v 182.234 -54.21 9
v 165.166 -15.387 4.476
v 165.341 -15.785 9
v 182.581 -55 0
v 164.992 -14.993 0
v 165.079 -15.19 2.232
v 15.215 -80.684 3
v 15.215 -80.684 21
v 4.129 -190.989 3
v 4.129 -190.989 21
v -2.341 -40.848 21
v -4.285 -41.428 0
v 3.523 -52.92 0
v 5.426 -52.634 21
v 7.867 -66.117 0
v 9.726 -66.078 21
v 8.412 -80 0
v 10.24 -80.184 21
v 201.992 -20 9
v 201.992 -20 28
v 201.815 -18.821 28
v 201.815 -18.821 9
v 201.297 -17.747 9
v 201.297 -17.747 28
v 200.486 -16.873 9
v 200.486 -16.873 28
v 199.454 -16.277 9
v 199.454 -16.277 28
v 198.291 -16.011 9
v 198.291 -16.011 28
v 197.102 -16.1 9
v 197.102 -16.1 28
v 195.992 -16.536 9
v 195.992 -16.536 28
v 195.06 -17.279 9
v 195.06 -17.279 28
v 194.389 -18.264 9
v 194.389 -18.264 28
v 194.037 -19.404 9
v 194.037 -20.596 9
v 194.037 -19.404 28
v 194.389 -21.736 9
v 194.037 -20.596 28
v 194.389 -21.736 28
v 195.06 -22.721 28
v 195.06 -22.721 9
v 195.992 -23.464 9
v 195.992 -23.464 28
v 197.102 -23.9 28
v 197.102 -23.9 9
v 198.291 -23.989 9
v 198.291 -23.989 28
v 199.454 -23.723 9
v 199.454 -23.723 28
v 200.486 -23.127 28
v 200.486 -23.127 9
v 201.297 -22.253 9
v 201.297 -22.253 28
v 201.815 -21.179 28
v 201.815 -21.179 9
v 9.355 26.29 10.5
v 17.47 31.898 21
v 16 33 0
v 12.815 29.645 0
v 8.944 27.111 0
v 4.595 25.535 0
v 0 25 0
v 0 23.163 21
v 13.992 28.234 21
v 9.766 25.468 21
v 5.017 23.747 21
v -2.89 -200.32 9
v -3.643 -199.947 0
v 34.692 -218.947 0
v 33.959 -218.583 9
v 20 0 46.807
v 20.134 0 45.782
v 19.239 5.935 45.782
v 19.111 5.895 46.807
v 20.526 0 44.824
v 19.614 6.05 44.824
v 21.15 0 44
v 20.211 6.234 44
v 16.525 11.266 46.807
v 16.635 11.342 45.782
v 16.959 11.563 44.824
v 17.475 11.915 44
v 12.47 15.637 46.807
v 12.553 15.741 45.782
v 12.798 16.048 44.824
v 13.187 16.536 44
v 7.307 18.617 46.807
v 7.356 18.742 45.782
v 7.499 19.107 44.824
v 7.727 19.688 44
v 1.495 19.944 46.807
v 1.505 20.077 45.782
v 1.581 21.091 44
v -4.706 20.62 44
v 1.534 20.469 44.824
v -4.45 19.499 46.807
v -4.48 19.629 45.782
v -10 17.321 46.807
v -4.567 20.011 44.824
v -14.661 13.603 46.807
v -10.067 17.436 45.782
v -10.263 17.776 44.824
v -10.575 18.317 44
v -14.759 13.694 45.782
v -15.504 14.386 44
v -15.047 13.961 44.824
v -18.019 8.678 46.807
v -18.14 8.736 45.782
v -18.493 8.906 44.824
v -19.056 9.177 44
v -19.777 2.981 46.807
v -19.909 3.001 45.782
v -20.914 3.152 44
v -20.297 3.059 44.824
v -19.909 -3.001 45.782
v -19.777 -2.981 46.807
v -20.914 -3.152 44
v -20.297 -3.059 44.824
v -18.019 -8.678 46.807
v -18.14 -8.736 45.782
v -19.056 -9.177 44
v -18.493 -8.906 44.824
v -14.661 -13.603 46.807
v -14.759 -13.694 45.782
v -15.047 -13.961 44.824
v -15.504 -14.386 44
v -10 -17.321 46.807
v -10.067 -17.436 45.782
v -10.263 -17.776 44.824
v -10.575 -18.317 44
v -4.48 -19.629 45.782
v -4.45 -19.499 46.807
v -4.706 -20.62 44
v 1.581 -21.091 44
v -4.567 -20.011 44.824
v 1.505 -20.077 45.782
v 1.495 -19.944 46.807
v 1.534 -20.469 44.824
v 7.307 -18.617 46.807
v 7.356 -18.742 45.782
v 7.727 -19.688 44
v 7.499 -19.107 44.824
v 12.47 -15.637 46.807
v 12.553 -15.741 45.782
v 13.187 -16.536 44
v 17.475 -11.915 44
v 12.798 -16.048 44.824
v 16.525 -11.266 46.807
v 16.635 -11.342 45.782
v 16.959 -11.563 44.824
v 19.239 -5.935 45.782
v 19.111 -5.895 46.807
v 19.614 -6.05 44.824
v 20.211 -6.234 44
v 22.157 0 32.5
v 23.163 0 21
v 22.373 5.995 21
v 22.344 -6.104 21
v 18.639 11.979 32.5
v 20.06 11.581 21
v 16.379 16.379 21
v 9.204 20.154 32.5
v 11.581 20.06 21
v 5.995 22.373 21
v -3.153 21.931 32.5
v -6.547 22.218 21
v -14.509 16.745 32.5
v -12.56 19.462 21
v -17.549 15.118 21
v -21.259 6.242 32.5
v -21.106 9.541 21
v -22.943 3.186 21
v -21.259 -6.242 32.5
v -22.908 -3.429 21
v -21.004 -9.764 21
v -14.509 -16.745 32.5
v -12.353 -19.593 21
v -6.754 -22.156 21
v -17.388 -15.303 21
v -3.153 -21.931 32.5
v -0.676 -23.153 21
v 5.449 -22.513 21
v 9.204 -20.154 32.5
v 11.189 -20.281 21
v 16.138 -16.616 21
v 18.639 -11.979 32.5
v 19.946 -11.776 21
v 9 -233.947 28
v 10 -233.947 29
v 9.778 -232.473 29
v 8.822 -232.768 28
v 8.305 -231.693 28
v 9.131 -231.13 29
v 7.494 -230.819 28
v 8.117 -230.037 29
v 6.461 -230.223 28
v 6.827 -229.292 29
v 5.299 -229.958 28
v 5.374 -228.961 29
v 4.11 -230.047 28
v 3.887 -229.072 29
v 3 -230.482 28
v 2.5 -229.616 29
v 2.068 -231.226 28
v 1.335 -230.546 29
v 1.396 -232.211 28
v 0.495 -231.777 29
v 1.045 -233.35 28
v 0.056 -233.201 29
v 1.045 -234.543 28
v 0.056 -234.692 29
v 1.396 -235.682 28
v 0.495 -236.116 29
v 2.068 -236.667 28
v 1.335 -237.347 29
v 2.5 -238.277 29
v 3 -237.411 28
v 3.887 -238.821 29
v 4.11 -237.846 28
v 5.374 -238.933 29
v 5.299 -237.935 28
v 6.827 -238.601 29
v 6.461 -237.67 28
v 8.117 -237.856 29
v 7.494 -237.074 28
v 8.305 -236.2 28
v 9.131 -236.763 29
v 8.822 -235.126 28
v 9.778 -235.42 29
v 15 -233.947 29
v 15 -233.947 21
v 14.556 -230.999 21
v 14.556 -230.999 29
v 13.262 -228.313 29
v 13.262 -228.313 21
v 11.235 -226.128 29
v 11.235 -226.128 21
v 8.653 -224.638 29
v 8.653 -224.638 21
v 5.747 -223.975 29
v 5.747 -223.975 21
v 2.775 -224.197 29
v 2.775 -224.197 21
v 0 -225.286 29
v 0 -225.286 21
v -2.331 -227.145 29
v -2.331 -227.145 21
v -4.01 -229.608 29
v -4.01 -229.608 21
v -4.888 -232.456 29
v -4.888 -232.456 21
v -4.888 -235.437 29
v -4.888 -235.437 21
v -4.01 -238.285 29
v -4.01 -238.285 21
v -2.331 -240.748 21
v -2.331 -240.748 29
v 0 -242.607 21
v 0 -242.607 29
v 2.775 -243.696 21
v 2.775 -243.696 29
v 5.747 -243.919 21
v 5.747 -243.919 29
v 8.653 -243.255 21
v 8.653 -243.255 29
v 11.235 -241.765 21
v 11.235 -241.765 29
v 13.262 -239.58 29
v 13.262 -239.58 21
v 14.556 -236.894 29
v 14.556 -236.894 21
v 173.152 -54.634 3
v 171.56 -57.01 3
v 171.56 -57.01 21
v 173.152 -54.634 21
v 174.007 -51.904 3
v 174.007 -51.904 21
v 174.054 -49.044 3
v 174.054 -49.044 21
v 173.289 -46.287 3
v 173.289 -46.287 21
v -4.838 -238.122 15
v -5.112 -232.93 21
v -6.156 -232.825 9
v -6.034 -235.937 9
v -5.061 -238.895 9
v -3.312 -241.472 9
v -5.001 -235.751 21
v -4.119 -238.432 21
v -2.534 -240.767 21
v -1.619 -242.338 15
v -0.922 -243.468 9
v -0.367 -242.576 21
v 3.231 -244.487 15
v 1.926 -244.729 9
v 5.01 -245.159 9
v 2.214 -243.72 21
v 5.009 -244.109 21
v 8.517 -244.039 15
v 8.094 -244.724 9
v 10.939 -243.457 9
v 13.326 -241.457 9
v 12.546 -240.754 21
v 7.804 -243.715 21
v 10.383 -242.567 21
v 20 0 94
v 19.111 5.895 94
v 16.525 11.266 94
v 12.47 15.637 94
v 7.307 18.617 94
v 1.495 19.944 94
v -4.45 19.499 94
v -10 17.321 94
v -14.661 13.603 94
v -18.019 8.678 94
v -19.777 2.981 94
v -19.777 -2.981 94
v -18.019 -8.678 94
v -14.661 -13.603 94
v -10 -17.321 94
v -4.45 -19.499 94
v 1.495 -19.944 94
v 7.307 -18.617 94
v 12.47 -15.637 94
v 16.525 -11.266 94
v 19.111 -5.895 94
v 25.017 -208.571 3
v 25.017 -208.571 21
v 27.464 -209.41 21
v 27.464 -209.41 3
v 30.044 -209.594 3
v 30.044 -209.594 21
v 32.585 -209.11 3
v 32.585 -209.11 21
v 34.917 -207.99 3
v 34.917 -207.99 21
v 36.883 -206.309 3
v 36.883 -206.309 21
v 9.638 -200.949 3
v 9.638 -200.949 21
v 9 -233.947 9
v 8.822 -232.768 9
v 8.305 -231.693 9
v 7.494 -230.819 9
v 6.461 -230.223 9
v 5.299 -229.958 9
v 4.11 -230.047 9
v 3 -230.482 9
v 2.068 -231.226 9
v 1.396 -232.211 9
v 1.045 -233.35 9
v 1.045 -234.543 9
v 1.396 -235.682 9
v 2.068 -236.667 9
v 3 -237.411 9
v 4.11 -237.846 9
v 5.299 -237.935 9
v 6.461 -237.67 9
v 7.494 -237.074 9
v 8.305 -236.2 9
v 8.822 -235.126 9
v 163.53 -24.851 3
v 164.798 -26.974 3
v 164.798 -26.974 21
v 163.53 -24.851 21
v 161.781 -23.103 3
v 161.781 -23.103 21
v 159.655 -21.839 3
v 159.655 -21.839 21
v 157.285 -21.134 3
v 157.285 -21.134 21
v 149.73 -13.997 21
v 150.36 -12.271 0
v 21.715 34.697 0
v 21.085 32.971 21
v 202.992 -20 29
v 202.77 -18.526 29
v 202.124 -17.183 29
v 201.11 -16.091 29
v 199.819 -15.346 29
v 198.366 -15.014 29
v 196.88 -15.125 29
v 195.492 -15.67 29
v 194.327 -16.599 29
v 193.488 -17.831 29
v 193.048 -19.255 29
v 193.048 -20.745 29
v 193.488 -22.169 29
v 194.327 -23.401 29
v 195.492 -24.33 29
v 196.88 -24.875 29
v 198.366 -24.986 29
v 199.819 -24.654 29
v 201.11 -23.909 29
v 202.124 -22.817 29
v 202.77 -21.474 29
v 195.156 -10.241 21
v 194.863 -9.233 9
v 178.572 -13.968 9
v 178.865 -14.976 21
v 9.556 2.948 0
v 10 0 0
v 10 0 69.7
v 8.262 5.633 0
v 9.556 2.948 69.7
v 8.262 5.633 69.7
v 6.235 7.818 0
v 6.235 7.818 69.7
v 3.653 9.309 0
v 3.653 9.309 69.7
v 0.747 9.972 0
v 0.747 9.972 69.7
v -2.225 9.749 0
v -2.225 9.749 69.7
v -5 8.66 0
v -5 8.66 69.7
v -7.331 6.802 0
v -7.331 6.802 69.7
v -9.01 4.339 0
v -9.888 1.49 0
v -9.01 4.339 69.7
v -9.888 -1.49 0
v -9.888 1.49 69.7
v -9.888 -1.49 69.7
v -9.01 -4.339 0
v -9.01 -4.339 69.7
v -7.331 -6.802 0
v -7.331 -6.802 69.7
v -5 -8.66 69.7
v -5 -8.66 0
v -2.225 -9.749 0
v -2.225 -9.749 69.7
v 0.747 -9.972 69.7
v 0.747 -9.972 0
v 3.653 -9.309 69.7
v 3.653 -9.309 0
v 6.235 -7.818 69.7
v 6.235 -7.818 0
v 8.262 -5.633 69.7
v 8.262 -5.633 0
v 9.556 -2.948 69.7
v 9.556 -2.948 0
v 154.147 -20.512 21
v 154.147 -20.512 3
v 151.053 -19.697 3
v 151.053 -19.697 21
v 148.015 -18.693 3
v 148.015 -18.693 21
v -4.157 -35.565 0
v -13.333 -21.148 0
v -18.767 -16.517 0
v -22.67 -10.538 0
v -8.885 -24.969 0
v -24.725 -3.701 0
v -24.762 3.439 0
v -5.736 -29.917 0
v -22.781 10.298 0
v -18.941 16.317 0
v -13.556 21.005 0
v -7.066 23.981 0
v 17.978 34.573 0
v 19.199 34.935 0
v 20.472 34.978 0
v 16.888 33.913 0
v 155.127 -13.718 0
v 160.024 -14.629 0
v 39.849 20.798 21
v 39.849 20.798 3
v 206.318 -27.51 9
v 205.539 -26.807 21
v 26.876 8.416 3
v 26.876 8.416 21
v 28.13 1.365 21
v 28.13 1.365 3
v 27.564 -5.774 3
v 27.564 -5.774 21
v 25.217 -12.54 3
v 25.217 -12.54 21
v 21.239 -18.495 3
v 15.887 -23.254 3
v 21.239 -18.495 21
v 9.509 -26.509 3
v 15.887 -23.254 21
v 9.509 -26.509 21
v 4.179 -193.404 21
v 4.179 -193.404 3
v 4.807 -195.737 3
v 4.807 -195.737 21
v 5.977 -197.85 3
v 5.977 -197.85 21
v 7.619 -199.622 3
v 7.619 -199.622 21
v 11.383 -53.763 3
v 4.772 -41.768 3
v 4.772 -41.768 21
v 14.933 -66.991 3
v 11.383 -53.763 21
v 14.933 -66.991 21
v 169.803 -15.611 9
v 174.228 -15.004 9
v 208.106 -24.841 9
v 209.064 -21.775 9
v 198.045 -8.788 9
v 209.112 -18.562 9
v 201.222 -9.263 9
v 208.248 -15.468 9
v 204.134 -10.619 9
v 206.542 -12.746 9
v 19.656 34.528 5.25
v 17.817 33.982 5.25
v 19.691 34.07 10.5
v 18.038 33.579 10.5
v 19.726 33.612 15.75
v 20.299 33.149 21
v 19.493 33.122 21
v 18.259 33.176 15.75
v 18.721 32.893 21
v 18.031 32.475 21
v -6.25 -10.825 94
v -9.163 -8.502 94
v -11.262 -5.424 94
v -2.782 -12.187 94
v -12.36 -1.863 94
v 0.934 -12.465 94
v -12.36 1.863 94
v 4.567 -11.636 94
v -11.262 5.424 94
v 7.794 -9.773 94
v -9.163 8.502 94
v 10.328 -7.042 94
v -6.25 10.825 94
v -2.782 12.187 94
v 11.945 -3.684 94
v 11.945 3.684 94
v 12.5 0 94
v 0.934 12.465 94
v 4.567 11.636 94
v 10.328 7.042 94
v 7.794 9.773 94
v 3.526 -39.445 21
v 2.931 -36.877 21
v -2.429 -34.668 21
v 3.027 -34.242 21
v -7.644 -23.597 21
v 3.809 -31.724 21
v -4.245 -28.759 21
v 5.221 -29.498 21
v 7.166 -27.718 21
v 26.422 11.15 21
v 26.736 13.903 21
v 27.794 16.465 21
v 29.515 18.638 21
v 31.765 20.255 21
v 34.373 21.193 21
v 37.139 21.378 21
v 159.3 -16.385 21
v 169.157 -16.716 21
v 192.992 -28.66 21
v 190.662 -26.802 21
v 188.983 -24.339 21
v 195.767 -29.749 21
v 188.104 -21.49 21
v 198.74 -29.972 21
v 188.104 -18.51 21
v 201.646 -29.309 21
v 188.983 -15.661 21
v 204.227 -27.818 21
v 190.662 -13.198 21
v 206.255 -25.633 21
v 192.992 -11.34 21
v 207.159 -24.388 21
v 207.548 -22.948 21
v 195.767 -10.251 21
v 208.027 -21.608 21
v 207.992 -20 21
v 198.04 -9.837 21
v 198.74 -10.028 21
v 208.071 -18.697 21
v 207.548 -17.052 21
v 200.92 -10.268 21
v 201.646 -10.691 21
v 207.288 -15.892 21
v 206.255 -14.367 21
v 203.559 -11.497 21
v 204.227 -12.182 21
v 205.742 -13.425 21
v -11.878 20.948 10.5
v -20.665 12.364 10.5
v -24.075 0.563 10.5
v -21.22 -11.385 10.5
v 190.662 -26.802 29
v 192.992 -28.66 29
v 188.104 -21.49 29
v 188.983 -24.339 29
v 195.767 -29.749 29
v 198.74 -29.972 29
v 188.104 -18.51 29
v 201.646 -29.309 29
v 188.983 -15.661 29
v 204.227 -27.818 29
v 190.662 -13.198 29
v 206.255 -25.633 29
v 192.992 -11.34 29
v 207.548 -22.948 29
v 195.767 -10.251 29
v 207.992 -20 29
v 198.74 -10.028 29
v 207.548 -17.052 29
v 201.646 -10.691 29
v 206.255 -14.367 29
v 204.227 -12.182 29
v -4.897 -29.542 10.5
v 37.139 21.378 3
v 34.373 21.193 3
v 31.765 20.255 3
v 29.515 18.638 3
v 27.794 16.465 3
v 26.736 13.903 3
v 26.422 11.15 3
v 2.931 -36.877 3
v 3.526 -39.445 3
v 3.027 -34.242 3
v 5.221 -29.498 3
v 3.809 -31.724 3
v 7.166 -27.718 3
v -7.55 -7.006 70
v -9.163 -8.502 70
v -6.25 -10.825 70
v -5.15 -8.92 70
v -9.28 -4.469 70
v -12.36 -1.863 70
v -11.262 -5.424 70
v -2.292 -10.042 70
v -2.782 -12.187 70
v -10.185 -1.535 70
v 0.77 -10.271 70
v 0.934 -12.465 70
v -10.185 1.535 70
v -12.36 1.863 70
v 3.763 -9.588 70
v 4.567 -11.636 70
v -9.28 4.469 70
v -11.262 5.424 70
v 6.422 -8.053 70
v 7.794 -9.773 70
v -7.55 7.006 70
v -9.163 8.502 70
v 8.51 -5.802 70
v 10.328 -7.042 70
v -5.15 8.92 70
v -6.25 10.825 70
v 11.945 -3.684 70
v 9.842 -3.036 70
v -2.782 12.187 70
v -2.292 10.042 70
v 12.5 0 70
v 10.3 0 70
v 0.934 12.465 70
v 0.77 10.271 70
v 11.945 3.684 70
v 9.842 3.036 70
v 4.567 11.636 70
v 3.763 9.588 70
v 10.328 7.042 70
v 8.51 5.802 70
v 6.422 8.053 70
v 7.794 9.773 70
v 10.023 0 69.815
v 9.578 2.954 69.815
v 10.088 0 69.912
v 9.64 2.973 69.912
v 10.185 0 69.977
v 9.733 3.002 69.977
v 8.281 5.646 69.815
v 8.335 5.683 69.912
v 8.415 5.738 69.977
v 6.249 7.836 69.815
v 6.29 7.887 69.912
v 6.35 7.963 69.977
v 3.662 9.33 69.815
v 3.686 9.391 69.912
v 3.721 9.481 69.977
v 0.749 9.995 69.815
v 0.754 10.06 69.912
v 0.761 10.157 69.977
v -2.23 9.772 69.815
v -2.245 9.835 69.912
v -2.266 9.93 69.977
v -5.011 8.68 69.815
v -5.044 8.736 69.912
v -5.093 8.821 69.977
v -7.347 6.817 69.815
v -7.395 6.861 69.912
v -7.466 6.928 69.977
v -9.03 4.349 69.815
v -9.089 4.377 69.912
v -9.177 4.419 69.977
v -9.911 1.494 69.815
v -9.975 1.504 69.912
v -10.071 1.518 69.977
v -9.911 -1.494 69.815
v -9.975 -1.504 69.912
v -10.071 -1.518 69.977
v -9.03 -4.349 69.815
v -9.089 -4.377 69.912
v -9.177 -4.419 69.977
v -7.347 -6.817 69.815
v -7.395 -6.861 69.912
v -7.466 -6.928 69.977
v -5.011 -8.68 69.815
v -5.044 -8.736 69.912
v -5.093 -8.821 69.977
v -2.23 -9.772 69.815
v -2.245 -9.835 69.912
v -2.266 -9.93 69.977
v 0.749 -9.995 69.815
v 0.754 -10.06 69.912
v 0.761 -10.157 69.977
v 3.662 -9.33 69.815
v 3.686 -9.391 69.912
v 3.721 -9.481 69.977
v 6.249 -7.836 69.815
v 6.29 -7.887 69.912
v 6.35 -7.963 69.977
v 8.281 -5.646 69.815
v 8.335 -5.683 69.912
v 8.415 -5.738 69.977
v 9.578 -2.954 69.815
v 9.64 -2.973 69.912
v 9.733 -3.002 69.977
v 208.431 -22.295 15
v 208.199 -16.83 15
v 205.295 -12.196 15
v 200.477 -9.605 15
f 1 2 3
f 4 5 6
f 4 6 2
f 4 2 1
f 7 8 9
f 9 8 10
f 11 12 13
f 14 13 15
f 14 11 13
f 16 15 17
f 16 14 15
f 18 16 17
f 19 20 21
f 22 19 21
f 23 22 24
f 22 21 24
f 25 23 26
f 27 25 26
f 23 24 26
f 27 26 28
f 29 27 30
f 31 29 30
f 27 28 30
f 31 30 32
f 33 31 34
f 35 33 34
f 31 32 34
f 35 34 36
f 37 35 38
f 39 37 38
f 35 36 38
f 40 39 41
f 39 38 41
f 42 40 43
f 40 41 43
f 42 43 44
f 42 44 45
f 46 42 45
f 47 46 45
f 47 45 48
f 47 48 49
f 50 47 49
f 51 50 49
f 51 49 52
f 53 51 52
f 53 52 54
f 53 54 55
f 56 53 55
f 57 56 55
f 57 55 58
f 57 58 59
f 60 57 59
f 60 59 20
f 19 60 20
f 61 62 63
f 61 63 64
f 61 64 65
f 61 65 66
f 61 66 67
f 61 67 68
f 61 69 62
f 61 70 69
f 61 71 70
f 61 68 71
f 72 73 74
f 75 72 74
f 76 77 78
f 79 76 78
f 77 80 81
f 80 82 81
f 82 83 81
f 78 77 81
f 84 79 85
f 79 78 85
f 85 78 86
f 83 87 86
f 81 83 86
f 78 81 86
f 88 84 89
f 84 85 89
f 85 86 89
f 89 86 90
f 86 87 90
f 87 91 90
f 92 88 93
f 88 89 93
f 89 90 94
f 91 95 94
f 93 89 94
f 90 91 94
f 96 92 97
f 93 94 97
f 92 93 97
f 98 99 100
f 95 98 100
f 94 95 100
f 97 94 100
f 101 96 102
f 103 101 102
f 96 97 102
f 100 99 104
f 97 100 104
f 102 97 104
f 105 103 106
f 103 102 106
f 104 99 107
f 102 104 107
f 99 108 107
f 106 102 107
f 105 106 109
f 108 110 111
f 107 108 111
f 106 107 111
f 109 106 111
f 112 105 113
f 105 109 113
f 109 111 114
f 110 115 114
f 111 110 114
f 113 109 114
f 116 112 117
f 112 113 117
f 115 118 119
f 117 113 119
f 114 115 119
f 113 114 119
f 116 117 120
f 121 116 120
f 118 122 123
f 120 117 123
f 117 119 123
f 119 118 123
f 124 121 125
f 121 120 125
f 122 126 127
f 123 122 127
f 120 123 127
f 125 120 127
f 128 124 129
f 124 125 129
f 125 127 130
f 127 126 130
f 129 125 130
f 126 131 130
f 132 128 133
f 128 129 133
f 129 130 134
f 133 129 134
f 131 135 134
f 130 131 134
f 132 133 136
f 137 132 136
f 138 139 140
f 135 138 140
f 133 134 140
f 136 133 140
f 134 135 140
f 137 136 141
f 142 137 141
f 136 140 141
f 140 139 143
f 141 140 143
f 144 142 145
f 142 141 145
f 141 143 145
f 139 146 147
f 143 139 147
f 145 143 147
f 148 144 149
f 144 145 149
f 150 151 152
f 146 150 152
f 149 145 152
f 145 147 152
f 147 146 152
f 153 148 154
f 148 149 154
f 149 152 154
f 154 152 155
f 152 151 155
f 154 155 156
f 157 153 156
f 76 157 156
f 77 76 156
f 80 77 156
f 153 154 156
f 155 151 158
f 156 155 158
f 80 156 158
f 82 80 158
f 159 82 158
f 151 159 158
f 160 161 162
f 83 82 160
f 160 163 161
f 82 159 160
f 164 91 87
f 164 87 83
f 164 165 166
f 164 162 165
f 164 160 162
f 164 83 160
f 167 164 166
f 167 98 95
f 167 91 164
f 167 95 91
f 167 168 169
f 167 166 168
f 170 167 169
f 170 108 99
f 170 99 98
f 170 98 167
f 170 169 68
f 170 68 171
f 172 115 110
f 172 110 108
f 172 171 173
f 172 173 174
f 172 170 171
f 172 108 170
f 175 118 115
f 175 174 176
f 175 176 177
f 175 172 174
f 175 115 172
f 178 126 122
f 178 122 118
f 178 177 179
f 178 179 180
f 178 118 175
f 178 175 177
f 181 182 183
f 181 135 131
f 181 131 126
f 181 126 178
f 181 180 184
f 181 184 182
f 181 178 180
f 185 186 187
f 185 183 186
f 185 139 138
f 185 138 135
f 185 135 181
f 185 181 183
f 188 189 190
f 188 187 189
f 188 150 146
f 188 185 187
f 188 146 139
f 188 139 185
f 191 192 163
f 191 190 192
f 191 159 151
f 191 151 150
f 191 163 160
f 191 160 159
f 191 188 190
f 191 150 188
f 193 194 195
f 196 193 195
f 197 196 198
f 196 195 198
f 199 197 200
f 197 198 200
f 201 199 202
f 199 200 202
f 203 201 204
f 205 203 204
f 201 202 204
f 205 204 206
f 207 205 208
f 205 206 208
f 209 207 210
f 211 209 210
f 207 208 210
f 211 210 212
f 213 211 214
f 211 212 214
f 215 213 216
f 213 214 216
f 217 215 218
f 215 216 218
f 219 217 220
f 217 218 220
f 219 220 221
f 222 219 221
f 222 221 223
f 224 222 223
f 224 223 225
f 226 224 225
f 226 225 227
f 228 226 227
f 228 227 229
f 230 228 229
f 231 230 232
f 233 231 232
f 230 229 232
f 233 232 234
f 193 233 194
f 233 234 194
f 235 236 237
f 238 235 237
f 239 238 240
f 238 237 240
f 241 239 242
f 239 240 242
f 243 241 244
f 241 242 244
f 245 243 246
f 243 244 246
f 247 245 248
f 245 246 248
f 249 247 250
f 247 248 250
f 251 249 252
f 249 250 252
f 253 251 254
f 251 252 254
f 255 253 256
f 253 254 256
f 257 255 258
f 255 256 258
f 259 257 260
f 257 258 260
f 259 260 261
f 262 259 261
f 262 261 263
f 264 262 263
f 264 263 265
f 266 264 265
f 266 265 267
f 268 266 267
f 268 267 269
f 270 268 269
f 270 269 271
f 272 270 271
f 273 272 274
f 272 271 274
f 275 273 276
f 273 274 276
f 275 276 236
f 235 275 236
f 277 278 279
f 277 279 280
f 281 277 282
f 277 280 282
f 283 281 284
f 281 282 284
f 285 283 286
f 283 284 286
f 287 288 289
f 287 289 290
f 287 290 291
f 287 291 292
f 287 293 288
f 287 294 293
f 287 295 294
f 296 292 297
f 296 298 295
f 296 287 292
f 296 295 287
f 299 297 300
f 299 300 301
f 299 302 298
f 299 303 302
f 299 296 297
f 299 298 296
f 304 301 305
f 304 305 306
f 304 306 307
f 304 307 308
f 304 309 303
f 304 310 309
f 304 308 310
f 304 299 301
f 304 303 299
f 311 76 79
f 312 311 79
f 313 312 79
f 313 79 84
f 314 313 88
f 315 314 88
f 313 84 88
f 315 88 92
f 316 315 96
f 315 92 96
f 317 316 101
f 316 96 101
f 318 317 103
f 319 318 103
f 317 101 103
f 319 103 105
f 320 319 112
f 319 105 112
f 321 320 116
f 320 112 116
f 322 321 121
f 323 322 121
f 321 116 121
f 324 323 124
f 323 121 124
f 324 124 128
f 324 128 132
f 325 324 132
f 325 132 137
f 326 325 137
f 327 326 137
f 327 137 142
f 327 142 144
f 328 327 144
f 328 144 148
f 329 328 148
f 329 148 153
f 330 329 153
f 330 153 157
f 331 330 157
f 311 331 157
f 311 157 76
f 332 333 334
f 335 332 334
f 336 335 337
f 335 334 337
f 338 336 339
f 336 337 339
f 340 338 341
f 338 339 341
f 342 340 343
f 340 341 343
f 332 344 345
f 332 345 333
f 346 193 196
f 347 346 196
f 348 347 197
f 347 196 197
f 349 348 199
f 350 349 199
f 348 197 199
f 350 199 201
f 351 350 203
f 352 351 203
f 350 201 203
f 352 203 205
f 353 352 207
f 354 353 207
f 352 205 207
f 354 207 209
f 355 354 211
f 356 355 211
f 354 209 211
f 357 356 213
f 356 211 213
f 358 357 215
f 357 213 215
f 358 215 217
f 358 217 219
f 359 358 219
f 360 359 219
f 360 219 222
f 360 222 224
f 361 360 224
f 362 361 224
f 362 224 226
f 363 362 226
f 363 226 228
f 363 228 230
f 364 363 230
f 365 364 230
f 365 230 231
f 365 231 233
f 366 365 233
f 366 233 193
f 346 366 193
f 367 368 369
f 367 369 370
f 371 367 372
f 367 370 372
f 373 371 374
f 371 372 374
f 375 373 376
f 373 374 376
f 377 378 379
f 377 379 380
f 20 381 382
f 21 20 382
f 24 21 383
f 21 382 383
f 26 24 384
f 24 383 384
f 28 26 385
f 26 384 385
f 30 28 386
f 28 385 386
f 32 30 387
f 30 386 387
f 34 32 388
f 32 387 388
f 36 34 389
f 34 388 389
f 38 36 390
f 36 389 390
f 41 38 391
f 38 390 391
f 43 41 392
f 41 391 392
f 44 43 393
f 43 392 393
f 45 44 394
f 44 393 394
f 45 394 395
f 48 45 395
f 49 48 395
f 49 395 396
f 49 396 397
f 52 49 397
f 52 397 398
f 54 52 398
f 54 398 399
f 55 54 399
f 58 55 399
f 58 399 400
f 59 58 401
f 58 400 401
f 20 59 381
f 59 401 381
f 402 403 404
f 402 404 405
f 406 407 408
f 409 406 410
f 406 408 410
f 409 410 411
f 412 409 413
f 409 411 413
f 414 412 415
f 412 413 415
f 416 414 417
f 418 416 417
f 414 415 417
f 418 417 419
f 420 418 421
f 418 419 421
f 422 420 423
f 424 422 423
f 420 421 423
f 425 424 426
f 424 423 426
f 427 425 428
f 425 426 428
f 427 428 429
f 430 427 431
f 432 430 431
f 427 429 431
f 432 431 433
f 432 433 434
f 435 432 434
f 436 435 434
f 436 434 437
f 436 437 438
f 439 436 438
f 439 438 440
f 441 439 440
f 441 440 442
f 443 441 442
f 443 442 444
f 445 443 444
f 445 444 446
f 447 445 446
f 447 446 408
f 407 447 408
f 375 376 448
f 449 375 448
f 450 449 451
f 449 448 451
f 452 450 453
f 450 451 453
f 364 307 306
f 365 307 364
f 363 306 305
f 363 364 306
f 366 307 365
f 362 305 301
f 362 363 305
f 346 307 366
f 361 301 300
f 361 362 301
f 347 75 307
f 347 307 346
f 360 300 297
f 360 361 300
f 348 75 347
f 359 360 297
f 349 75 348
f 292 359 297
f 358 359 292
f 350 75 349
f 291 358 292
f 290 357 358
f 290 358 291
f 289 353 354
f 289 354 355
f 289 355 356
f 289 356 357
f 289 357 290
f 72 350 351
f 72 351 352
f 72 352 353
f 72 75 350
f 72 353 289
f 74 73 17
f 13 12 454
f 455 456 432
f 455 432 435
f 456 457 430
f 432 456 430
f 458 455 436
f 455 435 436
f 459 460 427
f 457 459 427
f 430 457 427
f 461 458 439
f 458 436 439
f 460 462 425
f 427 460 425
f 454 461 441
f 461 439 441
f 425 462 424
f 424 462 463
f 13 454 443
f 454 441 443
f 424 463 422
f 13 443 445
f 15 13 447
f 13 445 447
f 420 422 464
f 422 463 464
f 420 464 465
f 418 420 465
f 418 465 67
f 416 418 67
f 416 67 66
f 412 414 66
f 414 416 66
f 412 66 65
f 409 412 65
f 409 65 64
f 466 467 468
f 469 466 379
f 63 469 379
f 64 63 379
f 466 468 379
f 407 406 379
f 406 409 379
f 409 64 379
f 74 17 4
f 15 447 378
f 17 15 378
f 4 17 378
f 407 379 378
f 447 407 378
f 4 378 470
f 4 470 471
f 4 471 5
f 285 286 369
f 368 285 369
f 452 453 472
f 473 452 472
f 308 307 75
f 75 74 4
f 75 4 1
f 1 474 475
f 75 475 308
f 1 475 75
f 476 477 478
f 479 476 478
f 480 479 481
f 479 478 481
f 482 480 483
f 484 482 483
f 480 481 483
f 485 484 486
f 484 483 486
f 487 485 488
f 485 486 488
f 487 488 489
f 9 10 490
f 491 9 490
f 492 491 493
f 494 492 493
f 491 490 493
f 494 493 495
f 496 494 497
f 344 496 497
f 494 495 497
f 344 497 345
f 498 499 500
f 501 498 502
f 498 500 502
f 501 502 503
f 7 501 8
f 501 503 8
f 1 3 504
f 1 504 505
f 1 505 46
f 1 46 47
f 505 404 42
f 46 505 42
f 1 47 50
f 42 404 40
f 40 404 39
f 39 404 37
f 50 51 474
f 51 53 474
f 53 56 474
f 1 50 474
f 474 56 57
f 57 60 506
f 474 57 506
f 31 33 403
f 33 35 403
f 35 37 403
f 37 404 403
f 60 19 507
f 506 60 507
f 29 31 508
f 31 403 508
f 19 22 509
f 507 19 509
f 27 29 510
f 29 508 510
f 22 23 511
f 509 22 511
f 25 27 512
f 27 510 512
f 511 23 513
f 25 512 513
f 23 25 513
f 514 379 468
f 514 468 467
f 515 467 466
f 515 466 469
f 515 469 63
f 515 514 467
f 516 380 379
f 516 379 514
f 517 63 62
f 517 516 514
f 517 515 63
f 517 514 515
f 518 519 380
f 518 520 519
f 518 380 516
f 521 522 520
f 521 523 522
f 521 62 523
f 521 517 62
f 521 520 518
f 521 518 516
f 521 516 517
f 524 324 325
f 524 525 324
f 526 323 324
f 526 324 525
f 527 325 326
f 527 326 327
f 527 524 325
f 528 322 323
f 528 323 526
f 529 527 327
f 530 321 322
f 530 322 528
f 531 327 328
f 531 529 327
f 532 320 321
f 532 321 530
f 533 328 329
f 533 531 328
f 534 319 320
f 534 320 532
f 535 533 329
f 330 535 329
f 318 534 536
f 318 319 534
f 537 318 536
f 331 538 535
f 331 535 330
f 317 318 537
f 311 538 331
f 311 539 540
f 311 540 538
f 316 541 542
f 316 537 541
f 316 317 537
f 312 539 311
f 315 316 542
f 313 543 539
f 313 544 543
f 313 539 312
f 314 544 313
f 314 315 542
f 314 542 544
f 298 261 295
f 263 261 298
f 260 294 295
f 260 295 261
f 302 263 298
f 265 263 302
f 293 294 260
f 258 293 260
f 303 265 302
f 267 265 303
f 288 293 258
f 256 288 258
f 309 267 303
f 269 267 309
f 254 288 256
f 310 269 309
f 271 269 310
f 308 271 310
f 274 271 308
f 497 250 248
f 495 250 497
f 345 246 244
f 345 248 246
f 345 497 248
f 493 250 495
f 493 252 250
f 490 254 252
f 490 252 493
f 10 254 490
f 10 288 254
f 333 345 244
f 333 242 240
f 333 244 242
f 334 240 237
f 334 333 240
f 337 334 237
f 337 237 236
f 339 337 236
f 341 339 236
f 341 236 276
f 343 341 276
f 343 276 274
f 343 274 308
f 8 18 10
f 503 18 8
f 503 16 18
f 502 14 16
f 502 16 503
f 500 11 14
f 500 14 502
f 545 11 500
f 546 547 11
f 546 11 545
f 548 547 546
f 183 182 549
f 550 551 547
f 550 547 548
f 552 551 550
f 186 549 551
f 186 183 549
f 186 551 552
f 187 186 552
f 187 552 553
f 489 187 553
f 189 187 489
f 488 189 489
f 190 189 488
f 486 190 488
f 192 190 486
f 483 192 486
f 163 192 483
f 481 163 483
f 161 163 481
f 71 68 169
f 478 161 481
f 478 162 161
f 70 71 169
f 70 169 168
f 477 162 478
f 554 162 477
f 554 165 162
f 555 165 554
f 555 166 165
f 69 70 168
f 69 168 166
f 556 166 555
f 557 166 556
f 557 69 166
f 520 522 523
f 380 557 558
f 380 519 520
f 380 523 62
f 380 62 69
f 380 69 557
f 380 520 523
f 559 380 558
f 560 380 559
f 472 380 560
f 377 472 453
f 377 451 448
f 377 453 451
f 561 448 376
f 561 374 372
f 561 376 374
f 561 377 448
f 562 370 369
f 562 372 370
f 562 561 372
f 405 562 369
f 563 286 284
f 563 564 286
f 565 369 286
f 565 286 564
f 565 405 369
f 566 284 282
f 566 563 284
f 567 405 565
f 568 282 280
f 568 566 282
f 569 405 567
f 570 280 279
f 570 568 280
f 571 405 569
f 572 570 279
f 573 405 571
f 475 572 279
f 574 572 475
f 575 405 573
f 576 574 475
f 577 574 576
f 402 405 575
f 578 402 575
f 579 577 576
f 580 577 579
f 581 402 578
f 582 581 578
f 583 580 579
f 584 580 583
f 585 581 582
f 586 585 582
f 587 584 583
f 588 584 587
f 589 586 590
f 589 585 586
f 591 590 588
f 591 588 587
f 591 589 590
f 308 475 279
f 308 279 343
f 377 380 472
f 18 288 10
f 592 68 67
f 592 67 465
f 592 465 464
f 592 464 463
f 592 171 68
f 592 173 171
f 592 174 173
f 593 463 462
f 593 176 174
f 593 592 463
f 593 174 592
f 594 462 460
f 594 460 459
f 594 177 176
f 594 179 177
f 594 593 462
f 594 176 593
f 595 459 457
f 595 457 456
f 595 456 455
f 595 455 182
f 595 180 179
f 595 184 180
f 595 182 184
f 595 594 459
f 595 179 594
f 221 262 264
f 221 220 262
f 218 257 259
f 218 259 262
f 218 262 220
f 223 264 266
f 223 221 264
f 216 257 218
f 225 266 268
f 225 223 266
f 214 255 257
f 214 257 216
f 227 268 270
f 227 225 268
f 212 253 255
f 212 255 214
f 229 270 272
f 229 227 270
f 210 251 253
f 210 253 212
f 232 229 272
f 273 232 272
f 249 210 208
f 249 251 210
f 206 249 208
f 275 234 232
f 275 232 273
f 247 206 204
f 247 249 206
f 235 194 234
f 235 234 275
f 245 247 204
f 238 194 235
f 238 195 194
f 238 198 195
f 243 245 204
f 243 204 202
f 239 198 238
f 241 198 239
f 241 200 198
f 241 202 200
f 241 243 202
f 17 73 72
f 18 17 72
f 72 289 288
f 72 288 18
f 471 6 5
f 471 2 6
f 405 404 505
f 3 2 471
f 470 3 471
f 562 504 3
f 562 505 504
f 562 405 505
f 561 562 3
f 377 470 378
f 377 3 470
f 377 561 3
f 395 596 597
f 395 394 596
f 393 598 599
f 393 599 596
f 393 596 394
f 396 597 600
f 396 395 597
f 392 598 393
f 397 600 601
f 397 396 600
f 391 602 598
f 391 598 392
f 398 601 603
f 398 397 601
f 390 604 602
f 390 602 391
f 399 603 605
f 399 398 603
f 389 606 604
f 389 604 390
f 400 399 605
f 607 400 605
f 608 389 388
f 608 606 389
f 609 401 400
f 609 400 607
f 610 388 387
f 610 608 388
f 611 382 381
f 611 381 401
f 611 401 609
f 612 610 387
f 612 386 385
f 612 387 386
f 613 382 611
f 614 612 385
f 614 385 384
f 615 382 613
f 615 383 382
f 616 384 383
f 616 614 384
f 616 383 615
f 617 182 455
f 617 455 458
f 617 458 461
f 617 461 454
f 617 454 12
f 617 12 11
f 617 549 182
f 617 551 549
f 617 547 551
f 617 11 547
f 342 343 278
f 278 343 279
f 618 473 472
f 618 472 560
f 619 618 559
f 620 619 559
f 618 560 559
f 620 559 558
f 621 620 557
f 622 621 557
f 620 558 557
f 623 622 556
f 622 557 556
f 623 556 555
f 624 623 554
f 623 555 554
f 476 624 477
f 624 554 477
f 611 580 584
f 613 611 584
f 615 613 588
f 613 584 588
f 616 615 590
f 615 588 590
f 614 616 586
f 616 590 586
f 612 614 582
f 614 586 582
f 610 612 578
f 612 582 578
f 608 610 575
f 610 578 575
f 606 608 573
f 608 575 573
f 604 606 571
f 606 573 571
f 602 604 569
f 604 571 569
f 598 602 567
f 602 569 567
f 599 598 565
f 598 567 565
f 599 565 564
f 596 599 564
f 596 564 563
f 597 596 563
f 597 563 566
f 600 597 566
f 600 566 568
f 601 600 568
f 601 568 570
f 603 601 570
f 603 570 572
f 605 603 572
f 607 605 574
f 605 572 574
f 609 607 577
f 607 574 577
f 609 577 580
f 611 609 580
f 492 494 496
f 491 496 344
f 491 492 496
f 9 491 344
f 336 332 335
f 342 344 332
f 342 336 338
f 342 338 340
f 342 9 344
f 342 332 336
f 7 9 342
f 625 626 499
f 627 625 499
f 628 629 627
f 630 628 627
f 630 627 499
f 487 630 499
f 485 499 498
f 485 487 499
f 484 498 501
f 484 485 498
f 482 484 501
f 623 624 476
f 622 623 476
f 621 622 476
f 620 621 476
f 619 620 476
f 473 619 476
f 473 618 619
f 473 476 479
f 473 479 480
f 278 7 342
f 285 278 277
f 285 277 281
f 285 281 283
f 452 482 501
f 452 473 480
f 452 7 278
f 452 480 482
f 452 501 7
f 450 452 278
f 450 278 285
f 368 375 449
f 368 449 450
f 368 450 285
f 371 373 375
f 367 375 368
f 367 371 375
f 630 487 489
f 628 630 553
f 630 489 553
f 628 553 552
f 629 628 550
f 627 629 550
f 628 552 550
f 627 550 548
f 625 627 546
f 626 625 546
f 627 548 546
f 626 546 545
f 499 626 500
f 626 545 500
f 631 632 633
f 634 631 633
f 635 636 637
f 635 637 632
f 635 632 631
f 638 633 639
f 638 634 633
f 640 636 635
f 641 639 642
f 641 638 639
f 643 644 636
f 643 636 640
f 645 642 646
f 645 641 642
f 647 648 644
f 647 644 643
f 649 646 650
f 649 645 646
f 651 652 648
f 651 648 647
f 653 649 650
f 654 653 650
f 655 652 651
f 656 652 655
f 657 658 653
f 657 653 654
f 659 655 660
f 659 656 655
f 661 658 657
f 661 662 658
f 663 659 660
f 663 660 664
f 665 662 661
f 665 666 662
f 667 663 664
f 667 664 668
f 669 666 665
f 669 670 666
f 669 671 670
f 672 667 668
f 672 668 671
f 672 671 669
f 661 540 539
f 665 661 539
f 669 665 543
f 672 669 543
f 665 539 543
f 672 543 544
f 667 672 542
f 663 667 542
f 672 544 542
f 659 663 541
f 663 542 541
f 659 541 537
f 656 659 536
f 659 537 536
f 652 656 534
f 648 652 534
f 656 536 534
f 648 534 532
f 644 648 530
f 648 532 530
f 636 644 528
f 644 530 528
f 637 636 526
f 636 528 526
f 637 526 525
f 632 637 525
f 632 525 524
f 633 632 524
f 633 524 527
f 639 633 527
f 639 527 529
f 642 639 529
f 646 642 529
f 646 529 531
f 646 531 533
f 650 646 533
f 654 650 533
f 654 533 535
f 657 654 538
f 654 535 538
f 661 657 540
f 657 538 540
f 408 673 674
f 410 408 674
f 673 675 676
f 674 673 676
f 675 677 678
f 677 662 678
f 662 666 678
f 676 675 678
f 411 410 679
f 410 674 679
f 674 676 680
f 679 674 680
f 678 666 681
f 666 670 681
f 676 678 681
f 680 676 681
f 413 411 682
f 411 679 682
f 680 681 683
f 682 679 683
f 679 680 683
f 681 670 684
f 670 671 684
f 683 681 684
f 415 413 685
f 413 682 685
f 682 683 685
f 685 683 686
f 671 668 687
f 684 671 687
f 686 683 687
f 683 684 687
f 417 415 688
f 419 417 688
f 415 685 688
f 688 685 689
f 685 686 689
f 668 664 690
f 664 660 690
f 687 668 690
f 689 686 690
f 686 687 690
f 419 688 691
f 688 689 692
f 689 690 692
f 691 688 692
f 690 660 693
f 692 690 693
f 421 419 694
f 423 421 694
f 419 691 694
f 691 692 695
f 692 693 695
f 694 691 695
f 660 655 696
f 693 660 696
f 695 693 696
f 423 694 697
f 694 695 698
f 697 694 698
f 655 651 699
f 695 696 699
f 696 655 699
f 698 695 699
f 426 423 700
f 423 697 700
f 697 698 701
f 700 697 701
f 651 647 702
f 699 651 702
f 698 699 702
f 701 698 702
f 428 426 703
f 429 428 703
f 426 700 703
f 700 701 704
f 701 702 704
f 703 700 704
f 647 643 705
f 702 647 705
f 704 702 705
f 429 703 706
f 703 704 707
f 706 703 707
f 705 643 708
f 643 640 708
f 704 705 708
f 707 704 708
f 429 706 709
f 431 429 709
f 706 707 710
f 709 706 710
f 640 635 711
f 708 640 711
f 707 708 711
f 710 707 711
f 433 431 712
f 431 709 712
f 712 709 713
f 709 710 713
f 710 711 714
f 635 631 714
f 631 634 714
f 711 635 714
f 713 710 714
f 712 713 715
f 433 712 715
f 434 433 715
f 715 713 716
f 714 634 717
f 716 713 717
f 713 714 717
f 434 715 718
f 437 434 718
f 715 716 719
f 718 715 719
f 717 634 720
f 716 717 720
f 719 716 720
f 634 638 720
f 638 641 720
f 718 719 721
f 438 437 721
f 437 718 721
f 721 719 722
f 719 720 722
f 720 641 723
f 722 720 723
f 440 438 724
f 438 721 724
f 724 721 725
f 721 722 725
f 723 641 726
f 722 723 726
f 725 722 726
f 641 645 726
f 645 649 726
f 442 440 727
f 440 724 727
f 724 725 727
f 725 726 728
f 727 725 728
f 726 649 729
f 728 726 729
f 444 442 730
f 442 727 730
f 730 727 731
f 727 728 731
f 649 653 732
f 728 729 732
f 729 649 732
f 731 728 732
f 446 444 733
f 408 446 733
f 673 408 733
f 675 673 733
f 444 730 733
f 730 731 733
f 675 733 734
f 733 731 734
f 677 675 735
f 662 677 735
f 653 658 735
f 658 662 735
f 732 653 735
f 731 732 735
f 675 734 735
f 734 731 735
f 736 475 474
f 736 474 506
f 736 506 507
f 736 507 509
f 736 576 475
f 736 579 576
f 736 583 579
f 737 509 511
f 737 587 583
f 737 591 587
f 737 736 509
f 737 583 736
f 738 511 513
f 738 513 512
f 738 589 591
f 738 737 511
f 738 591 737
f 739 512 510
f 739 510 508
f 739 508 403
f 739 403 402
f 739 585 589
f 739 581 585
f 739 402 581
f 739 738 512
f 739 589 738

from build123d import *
from build123d.topology import SkipClean

# Parameters (mm, degrees)
EXTRUDE_741_DEPTH      = 21
EXTRUDE_741_TAPER      = 5
SKETCH_2_R             = 10
EXTRUDE_1024_DEPTH     = 8
CUT_EXTRUDE_1617_DEPTH = 9
SKETCH_4_R             = 23.162738066
EXTRUDE_1852_DEPTH     = 23
EXTRUDE_1852_TAPER     = 5
SKETCH_5_R             = 20
EXTRUDE_1938_DEPTH     = 50
FILLET_1977_R          = 4
SKETCH_6_R             = 12.5
CUT_EXTRUDE_2083_DEPTH = 24
SKETCH_7_R             = 10
CUT_EXTRUDE_2165_DEPTH = 330.802615362
FILLET_2203_R          = 0.3
SKETCH_8_R             = 4
CUT_EXTRUDE_2369_DEPTH = 329.777683375
CHAMFER_2404_SIZE      = 1
CUT_EXTRUDE_3109_DEPTH = 18


with BuildPart() as part:
    # Эскиз1 → Extrude 741 (new body)
    with BuildSketch(Plane.XY):
        with BuildLine():
            ThreePointArc((206.902825712, -28.037707575), (208.16042902, -13.627270923), (194.643197369, -8.47686326))
            Line((194.643197369, -8.47686326), (178.352602864, -13.211762774))
            ThreePointArc((178.352602864, -13.211762774), (164.281318134, -14.974601832), (150.3601632, -12.270882024))
            Line((150.3601632, -12.270882024), (21.714759937, 34.696764669))
            ThreePointArc((21.714759937, 34.696764669), (18.576858011, 34.793189635), (16, 33))
            ThreePointArc((16, 33), (8.94427191, 27.11145618), (0, 25))
            ThreePointArc((0, 25), (-24.017605322, 6.939354046), (-13.333333333, -21.147629234))
            ThreePointArc((-13.333333333, -21.147629234), (-5.735545873, -29.916516988), (-4.284649798, -41.428018512))
            ThreePointArc((-4.284649798, -41.428018512), (6.155658081, -59.36704661), (8.411759167, -80))
            Line((8.411759167, -80), (-6.939849245, -232.746575098))
            ThreePointArc((-6.939849245, -232.746575098), (0.139115456, -244.91798346), (13.910401615, -241.984282673))
            Line((13.910401615, -241.984282673), (206.902825712, -28.037707575))
        make_face()
    extrude(amount=EXTRUDE_741_DEPTH, taper=EXTRUDE_741_TAPER)

    # Эскиз2 → Extrude 1024 (add)
    with BuildSketch(Plane.XY.offset(21)):
        with Locations((5, -233.946575098)):
            Circle(SKETCH_2_R)
        with Locations((197.992424097, -20)):
            Circle(SKETCH_2_R)
    extrude(amount=EXTRUDE_1024_DEPTH)

    # Эскиз3 → Cut-Extrude 1617 (cut)
    with BuildSketch(Plane(origin=(0, 0, 0), x_dir=(-1, 0, 0), z_dir=(0, 0, -1))):
        with BuildLine():
            Line((-164.992424097, -14.992878037), (-182.581248366, -55))
            Line((-182.581248366, -55), (-206.902825712, -28.037707575))
            ThreePointArc((-206.902825712, -28.037707575), (-208.364208989, -13.964597929), (-195.406790483, -8.281873067))
            Line((-195.406790483, -8.281873067), (-164.992424097, -14.992878037))
        make_face()
        with BuildLine():
            Line((3.643325211, -199.946575098), (-34.691772051, -218.946575098))
            Line((-34.691772051, -218.946575098), (-13.910401615, -241.984282673))
            ThreePointArc((-13.910401615, -241.984282673), (-0.139115456, -244.91798346), (6.939849245, -232.746575098))
            Line((6.939849245, -232.746575098), (3.643325211, -199.946575098))
        make_face()
    extrude(amount=-CUT_EXTRUDE_1617_DEPTH, mode=Mode.SUBTRACT)

    # Эскиз4 → Extrude 1852 (add)
    with SkipClean():  # the faces are left unmerged after this step: merging them gives an invalid solid
        with BuildSketch(Plane.XY.offset(21)):
            Circle(SKETCH_4_R)
        extrude(amount=EXTRUDE_1852_DEPTH, taper=EXTRUDE_1852_TAPER)

    # Эскиз5 → Extrude 1938 (add)
    with SkipClean():  # the faces are left unmerged after this step: merging them gives an invalid solid
        with BuildSketch(Plane.XY.offset(44)):
            Circle(SKETCH_5_R)
        extrude(amount=EXTRUDE_1938_DEPTH)

    # Fillet 1977
    # the kernel refuses this fillet: 4 mm, written as the material it adds along each edge
    with BuildSketch(Plane(origin=(0, 0, 44), x_dir=(1, 0, 0), z_dir=(0, -1, 0))) as fillet_1977_piece_1:
        with BuildLine():
            CenterArc((24, 2.807194852), FILLET_1977_R, 180, 44.571493735)
            Line((20, 2.807194852), (19.92, 2.807194852))
            Line((19.92, 2.807194852), (19.92, 0))
            Line((19.92, 0), (20, -0.08))
            ThreePointArc((20, -0.08), (20.575249402, -0.08), (21.093508781, -0.056143897))
            Line((21.093508781, -0.056143897), (21.150498805, 0))
        make_face()
    revolve(axis=Axis((0, 0, 44), (0, 0, 1)))

    # Эскиз6 → Cut-Extrude 2083 (cut)
    with SkipClean():  # the faces are left unmerged after this step: merging them gives an invalid solid
        with BuildSketch(Plane.XY.offset(94)):
            Circle(SKETCH_6_R)
        extrude(amount=-CUT_EXTRUDE_2083_DEPTH, mode=Mode.SUBTRACT)

    # Эскиз7 → Cut-Extrude 2165 (cut, through all)
    with SkipClean():  # the faces are left unmerged after this step: merging them gives an invalid solid
        with BuildSketch(Plane.XY.offset(70)):
            Circle(SKETCH_7_R)
        extrude(amount=-CUT_EXTRUDE_2165_DEPTH, mode=Mode.SUBTRACT)

    # Fillet 2203
    fillet_2203_edges = [part.edges().sort_by_distance(p)[0] for p in [
        (-10, 0, 70),
    ]]
    fillet(fillet_2203_edges, radius=FILLET_2203_R)

    # Эскиз8 → Cut-Extrude 2369 (cut, through all)
    with SkipClean():  # the faces are left unmerged after this step: merging them gives an invalid solid
        with BuildSketch(Plane.XY.offset(29)):
            with Locations((197.992424097, -20)):
                Circle(SKETCH_8_R)
            with Locations((5, -233.946575098)):
                Circle(SKETCH_8_R)
        extrude(amount=-CUT_EXTRUDE_2369_DEPTH, mode=Mode.SUBTRACT)

    # Chamfer 2404
    chamfer_2404_edges = [part.edges().sort_by_distance(p)[0] for p in [
        (193.992424097, -20, 29),
        (1, -233.946575098, 29),
    ]]
    chamfer(chamfer_2404_edges, length=CHAMFER_2404_SIZE)

    # Эскиз11 → Cut-Extrude 3109 (cut)
    with SkipClean():  # the faces are left unmerged after this step: merging them gives an invalid solid
        with BuildSketch(Plane.XY.offset(21)):
            with BuildLine():
                Line((9.637769662, -200.948644603), (25.017172577, -208.571128339))
                ThreePointArc((25.017172577, -208.571128339), (31.330335402, -209.434392448), (36.883287498, -206.3093368))
                Line((36.883287498, -206.3093368), (171.559935828, -57.010172388))
                ThreePointArc((171.559935828, -57.010172388), (174.007077586, -51.904002649), (173.288958057, -46.287439952))
                Line((173.288958057, -46.287439952), (164.797960407, -26.974018349))
                ThreePointArc((164.797960407, -26.974018349), (161.780560792, -23.10323492), (157.284911476, -21.134275293))
                ThreePointArc((157.284911476, -21.134275293), (152.593572172, -20.128602218), (148.015310631, -18.693484081))
                Line((148.015310631, -18.693484081), (39.848510542, 20.797550357))
                ThreePointArc((39.848510542, 20.797550357), (29.514566508, 18.6378946), (26.875914748, 8.415760323))
                ThreePointArc((26.875914748, 8.415760323), (25.216951873, -12.539742964), (9.508763983, -26.50892723))
                ThreePointArc((9.508763983, -26.50892723), (3.334586222, -32.957378734), (4.772476125, -41.76847801))
                ThreePointArc((4.772476125, -41.76847801), (13.557685978, -60.269741059), (15.214748896, -80.683726193))
                Line((15.214748896, -80.683726193), (4.128675533, -190.988763419))
                ThreePointArc((4.128675533, -190.988763419), (5.327976017, -196.828955218), (9.637769662, -200.948644603))
            make_face()
        extrude(amount=-CUT_EXTRUDE_3109_DEPTH, mode=Mode.SUBTRACT)


solid = part.part
